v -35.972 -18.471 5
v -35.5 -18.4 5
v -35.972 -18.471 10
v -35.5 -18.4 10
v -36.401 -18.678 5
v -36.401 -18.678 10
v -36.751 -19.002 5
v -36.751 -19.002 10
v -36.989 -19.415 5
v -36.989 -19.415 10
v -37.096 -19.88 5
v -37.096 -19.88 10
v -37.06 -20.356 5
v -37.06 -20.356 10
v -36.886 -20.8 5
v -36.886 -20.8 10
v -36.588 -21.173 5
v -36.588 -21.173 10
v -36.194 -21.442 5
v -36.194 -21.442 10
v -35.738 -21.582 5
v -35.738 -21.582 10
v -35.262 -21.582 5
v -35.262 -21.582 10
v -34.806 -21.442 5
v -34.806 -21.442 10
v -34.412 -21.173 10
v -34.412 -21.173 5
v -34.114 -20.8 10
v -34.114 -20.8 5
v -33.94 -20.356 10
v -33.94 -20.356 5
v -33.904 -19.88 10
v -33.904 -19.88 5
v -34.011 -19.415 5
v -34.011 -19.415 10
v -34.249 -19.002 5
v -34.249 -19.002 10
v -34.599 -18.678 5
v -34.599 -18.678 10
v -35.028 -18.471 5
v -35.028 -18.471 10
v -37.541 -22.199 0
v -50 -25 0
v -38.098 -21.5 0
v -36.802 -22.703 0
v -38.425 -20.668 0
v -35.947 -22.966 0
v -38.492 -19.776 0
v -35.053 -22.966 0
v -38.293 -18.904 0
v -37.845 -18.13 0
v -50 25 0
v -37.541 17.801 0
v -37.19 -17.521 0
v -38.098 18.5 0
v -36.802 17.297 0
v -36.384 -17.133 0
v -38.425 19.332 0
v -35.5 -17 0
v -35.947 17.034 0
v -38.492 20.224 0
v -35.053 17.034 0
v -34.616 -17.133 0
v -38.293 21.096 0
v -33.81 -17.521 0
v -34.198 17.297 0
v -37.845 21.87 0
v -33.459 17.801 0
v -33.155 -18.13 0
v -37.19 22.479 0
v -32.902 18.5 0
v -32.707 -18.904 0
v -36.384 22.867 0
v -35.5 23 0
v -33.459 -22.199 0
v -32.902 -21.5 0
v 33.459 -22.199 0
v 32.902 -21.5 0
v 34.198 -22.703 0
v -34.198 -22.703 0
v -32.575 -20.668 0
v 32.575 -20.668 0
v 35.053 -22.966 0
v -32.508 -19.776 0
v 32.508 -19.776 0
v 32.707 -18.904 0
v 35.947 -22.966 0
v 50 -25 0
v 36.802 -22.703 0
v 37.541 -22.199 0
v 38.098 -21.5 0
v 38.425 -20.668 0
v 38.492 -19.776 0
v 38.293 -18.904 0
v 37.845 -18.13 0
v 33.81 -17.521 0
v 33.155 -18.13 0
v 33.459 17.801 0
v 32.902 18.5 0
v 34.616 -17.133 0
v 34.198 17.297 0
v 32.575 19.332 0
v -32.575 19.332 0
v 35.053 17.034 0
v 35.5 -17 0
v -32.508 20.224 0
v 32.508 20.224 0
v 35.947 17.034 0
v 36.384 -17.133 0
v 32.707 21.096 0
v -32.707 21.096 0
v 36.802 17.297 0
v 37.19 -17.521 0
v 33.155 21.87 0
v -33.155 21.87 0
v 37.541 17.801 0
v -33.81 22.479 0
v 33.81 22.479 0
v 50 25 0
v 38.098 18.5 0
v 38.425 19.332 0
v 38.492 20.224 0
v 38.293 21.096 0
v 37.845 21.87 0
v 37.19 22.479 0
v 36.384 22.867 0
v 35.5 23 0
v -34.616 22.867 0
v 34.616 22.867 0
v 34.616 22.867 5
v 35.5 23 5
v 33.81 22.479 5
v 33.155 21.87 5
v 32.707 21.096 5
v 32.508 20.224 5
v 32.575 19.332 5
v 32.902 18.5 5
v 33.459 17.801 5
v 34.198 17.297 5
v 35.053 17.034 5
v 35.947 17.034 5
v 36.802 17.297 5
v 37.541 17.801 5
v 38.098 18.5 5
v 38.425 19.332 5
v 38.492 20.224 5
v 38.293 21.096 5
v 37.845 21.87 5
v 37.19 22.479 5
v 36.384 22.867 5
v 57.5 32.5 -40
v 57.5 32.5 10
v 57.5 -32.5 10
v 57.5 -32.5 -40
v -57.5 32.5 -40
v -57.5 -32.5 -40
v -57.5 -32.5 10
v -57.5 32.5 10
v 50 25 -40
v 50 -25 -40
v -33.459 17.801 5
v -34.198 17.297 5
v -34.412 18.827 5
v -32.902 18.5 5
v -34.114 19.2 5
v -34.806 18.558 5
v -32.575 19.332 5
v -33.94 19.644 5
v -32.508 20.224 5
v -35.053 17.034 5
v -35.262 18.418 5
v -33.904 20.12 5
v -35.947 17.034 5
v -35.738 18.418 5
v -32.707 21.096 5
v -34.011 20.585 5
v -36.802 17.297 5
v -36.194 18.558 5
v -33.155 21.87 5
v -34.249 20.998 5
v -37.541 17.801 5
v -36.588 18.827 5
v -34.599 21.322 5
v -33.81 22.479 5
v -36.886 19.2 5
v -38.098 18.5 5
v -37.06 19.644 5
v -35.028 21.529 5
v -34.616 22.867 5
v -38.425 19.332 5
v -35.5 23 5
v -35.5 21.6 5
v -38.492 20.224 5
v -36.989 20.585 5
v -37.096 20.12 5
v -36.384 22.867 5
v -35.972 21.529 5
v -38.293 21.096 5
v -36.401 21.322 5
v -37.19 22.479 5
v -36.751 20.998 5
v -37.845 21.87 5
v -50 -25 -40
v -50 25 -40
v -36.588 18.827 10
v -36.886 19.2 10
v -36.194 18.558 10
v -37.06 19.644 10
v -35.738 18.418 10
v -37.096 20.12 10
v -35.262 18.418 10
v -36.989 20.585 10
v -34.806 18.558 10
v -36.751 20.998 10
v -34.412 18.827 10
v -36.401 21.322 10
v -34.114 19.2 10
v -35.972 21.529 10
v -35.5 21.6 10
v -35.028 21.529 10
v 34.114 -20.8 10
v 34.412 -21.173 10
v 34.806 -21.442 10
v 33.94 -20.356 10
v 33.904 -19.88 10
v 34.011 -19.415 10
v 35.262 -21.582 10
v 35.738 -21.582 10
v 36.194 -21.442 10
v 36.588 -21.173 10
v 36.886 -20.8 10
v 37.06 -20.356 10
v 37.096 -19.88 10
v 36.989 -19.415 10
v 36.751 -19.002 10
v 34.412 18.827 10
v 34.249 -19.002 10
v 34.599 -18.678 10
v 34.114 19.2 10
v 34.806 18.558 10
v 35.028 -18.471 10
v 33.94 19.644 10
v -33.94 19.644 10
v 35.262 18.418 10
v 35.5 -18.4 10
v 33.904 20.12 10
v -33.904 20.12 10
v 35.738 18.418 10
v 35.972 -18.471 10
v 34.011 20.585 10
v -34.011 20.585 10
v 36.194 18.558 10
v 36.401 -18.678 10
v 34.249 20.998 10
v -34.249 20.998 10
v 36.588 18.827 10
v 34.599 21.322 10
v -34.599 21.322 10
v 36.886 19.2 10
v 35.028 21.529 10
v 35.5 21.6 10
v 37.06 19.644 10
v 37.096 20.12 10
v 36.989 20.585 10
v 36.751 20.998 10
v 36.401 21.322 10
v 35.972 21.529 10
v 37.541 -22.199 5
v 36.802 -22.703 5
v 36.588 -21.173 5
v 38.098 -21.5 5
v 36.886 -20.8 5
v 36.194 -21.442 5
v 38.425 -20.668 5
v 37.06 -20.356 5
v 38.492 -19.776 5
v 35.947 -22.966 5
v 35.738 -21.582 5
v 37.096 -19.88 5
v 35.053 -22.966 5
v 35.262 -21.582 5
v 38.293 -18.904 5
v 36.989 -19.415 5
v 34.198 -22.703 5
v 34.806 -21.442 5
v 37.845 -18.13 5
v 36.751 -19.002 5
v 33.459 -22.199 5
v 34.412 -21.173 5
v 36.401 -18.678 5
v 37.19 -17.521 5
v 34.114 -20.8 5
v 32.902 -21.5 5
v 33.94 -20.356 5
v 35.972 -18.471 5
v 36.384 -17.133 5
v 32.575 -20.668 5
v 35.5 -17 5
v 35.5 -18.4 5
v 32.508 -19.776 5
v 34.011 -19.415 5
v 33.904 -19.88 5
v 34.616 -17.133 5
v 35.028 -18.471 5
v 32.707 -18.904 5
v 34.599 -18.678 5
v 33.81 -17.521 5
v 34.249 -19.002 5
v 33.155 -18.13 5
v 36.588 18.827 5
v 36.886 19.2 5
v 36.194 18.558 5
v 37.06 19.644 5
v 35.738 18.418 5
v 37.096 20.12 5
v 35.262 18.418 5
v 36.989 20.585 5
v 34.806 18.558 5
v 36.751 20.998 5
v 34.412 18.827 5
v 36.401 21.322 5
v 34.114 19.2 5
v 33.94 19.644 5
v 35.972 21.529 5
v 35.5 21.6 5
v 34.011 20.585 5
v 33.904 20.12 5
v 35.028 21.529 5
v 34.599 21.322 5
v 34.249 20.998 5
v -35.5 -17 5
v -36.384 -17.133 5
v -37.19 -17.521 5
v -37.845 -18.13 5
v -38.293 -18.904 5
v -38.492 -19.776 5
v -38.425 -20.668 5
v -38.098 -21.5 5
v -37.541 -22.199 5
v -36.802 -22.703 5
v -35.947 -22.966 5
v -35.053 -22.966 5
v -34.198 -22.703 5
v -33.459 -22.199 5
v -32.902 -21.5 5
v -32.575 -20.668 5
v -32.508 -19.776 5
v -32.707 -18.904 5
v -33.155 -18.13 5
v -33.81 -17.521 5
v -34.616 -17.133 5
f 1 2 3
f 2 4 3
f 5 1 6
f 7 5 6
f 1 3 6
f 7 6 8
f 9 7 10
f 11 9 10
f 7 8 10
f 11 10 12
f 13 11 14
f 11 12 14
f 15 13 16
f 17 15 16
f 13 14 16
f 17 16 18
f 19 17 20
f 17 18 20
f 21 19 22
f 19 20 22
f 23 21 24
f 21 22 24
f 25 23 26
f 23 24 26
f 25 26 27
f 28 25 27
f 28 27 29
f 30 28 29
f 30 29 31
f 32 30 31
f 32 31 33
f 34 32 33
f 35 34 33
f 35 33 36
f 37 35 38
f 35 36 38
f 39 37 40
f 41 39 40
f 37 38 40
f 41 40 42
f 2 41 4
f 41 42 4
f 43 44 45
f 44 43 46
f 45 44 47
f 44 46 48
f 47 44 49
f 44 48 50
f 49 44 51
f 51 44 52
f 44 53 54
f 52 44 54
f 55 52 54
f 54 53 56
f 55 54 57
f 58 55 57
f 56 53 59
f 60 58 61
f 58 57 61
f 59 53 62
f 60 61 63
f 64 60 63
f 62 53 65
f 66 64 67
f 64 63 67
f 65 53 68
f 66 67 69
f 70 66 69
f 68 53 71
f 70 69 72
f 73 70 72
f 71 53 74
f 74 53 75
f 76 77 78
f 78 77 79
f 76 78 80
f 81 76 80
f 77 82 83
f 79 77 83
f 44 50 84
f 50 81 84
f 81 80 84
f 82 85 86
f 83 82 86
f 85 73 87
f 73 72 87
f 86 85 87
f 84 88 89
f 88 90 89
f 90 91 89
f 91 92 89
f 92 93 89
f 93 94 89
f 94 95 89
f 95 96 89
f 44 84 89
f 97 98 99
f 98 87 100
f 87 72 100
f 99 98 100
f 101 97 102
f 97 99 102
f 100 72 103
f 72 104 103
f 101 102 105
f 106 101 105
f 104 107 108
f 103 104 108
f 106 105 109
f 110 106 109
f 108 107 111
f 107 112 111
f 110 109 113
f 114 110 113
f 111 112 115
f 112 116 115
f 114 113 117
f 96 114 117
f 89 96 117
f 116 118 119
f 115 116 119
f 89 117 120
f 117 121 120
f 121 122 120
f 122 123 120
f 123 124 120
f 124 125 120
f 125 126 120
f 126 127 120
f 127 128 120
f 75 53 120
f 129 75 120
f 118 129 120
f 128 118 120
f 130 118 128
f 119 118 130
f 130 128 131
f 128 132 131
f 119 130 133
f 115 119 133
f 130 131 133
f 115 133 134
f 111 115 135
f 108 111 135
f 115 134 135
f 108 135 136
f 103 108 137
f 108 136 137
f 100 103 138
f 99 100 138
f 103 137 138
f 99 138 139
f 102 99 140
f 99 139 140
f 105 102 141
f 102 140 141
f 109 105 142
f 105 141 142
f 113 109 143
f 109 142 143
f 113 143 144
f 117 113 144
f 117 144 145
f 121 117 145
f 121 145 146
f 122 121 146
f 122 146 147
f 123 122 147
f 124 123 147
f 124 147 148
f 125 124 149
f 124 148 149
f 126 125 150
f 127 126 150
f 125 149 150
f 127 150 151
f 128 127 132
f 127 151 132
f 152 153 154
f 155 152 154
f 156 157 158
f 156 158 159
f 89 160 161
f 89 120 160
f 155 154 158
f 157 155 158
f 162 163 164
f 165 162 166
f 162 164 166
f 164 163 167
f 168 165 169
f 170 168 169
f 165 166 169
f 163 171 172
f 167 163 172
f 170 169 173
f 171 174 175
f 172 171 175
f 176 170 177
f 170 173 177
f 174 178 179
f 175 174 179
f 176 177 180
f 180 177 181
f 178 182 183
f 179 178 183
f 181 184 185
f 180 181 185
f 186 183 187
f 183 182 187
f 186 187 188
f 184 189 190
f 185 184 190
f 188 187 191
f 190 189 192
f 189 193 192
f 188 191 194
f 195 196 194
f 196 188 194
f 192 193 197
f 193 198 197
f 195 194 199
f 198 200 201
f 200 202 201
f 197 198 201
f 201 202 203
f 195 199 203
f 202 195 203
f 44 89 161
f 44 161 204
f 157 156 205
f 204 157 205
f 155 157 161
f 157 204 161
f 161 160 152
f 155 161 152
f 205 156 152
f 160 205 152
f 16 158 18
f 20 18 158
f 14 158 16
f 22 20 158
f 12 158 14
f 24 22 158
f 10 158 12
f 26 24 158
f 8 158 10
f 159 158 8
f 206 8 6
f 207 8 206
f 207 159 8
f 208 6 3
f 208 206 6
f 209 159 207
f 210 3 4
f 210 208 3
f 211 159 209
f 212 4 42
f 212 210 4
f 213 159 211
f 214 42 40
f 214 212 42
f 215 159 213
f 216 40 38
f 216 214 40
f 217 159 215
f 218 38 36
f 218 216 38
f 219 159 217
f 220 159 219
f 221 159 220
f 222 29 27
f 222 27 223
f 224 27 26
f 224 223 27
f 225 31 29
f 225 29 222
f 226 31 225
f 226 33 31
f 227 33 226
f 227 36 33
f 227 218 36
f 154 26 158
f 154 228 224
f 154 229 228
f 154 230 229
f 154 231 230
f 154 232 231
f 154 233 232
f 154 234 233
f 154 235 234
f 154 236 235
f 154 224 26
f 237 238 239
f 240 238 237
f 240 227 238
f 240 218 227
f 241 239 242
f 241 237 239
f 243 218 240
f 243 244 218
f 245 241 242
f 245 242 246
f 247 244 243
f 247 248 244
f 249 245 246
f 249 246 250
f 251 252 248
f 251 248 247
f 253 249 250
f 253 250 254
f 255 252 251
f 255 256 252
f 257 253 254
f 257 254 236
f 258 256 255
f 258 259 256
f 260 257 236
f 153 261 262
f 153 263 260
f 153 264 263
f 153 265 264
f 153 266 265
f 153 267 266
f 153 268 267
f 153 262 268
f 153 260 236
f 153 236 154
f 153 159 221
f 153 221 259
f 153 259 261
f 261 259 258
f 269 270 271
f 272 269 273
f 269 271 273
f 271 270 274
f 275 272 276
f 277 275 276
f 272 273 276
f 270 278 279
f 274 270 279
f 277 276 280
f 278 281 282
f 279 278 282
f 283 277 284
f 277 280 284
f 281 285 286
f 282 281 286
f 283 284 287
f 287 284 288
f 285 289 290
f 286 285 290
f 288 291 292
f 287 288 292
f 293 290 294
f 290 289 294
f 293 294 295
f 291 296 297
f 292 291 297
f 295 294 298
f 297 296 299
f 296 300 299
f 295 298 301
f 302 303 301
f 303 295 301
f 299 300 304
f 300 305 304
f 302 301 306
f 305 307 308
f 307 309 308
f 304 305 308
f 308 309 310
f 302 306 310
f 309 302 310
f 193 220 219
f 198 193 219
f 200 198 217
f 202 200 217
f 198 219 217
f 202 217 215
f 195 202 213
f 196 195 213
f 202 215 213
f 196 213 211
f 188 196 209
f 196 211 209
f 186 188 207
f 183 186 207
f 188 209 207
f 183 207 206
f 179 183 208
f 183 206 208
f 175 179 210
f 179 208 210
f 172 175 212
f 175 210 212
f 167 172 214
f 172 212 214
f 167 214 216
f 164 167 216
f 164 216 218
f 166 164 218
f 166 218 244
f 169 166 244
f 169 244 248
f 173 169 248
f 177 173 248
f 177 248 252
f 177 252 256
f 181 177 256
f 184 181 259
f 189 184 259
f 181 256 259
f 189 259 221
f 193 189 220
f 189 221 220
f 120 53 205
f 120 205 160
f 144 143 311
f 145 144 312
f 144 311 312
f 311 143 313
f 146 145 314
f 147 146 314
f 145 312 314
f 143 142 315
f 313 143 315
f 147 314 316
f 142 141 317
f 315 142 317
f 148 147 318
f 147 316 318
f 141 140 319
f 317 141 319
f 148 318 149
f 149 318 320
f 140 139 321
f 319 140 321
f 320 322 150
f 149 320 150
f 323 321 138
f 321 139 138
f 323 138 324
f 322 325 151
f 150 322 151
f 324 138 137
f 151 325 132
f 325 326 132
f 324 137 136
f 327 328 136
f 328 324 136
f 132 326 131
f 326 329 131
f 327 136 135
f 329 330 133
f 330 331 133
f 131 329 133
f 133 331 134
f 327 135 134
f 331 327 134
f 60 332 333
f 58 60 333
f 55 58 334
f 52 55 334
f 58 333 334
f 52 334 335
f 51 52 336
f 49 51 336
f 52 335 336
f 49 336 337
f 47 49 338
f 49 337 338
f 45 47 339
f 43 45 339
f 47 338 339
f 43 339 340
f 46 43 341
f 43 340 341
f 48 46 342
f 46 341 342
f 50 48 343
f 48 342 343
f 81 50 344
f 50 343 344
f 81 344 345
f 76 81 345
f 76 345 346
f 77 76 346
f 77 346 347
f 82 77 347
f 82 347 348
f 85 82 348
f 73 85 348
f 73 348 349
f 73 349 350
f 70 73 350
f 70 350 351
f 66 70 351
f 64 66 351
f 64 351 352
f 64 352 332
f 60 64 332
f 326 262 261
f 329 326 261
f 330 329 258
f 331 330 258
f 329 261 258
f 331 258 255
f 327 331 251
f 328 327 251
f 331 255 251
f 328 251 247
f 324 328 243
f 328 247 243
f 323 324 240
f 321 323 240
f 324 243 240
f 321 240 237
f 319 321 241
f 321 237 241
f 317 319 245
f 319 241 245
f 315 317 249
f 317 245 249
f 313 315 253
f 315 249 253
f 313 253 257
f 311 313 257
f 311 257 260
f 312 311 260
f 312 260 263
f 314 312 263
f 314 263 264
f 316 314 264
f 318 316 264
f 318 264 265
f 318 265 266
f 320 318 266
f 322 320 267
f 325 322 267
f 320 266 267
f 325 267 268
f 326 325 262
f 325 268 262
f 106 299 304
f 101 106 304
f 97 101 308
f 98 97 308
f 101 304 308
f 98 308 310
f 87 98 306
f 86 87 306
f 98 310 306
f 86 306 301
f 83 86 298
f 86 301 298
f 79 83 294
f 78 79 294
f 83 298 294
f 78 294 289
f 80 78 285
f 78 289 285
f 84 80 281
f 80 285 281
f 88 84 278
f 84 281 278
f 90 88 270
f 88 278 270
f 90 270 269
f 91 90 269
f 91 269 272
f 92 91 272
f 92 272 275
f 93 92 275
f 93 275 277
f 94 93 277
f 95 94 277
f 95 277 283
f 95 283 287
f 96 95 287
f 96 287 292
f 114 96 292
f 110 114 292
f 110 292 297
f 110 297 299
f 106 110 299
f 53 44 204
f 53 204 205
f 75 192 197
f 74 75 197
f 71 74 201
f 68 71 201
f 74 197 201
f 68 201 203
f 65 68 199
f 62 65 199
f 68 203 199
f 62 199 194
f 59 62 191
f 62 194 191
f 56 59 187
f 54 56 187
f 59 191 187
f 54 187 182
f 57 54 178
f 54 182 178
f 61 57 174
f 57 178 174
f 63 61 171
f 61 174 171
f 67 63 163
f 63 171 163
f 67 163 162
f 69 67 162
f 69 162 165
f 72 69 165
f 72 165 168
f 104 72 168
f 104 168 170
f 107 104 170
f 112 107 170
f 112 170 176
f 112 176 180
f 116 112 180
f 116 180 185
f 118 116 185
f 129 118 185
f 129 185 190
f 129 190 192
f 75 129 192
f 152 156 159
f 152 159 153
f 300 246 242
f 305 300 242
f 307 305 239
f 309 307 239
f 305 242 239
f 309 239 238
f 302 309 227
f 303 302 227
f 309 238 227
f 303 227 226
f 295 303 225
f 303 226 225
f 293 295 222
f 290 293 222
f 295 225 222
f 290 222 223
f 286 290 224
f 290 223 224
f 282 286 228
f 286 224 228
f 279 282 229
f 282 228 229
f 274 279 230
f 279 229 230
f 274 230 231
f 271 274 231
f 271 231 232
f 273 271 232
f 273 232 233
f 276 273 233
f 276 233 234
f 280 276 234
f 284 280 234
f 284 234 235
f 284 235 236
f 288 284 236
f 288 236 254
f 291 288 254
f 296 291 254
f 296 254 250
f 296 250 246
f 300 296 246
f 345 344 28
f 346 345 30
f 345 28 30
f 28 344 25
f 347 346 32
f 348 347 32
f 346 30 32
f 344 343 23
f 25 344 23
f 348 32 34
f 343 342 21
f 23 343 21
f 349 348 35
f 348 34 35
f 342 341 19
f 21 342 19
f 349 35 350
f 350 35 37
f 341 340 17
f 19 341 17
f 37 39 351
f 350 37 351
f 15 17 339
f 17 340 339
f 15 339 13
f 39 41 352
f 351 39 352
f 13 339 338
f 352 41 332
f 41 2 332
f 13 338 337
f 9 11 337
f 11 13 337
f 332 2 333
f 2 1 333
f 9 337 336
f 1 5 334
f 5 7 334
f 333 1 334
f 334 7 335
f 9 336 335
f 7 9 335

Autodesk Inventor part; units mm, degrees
ref_plane "YZ Plane" through (0, 0, 0) normal (1, 0, 0) x (0, 1, 0)
ref_plane "XZ Plane" through (0, 0, 0) normal (0, 1, 0) x (-1, 0, 0)
ref_plane "XY Plane" through (0, 0, 0) normal (0, 0, 1) x (1, 0, 0)
sketch "Sketch1" plane through (0, 0, 0) normal (0, 0, 1) x (1, 0, 0)
  line L0 (57.5, -32.5) -> (-57.5, -32.5)
  line L1 (-57.5, -32.5) -> (-57.5, 32.5)
  line L2 (-57.5, 32.5) -> (57.5, 32.5)
  line L3 (57.5, 32.5) -> (57.5, -32.5)
  line L4 (50, -25) -> (-50, -25)
  line L5 (-50, -25) -> (-50, 25)
  line L6 (-50, 25) -> (50, 25)
  line L7 (50, 25) -> (50, -25)
  line L8 (57.5, 0) -> (-57.5, 0) construction
  line L9 (0, -32.5) -> (0, 32.5) construction
  line L10 (-37.5, 32.5) -> (-37.5, 25)
  line L11 (-57.5, 17.5) -> (-50, 17.5)
  line L12 (37.5, -25) -> (37.5, -32.5)
  line L13 (50, -17.5) -> (57.5, -17.5)
  line L14 (-37.5, -25) -> (-37.5, -32.5)
  line L15 (-57.5, -17.5) -> (-50, -17.5)
  line L16 (37.5, 32.5) -> (37.5, 25)
  line L17 (50, 17.5) -> (57.5, 17.5)
  line L18 (-53.75, 28.75) -> (53.75, 28.75) construction
  line L19 (53.75, 28.75) -> (53.75, -28.75) construction
  line L20 (53.75, -28.75) -> (-53.75, -28.75) construction
  line L21 (-53.75, -28.75) -> (-53.75, 28.75) construction
  line L22 (-53.75, 28.75) -> (53.75, -28.75) construction
  line L23 (53.75, 28.75) -> (-53.75, -28.75) construction
  point P0 (0, 0)
  point P1 (-35.5, 20)
  point P2 (35.5, 20)
  point P3 (35.5, -20)
  point P4 (-35.5, -20)
  dimension "d0" = 115
  dimension "d1" = 65
  dimension "d2" = 100
  dimension "d3" = 50
  dimension "d4" = 15
  dimension "d5" = 20
  dimension "d6" = 40
  dimension "d7" = 71
extrude "Extrusion1" add sketch "Sketch1" against normal blind 40 contours L0 L12 L4 L7 L13 L3 | L0 L1 L15 L5 L4 L14 | L17 L7 L6 L16 L2 L3 | L1 L2 L10 L6 L5 L11
extrude "Extrusion2" add sketch "Sketch1" along normal blind 10
hole "Hole1" at (-35.5, 20, 0) at (35.5, 20, 0) at (35.5, -20, 0) at (-35.5, -20, 0) direction (0, 0, 1) diameter 3.2 end through all counterbore diameter 6 counterbore depth 5
extrude "Extrusion8" add sketch "Sketch1" against normal blind 40 contours L0 L14 L4 L12 | L13 L7 L17 L3 | L1 L11 L5 L15 | L16 L6 L10 L2
equation "\"epsilon\" = 0"
properties part number "magnet_holder" material "PC/ABS Plastic"
